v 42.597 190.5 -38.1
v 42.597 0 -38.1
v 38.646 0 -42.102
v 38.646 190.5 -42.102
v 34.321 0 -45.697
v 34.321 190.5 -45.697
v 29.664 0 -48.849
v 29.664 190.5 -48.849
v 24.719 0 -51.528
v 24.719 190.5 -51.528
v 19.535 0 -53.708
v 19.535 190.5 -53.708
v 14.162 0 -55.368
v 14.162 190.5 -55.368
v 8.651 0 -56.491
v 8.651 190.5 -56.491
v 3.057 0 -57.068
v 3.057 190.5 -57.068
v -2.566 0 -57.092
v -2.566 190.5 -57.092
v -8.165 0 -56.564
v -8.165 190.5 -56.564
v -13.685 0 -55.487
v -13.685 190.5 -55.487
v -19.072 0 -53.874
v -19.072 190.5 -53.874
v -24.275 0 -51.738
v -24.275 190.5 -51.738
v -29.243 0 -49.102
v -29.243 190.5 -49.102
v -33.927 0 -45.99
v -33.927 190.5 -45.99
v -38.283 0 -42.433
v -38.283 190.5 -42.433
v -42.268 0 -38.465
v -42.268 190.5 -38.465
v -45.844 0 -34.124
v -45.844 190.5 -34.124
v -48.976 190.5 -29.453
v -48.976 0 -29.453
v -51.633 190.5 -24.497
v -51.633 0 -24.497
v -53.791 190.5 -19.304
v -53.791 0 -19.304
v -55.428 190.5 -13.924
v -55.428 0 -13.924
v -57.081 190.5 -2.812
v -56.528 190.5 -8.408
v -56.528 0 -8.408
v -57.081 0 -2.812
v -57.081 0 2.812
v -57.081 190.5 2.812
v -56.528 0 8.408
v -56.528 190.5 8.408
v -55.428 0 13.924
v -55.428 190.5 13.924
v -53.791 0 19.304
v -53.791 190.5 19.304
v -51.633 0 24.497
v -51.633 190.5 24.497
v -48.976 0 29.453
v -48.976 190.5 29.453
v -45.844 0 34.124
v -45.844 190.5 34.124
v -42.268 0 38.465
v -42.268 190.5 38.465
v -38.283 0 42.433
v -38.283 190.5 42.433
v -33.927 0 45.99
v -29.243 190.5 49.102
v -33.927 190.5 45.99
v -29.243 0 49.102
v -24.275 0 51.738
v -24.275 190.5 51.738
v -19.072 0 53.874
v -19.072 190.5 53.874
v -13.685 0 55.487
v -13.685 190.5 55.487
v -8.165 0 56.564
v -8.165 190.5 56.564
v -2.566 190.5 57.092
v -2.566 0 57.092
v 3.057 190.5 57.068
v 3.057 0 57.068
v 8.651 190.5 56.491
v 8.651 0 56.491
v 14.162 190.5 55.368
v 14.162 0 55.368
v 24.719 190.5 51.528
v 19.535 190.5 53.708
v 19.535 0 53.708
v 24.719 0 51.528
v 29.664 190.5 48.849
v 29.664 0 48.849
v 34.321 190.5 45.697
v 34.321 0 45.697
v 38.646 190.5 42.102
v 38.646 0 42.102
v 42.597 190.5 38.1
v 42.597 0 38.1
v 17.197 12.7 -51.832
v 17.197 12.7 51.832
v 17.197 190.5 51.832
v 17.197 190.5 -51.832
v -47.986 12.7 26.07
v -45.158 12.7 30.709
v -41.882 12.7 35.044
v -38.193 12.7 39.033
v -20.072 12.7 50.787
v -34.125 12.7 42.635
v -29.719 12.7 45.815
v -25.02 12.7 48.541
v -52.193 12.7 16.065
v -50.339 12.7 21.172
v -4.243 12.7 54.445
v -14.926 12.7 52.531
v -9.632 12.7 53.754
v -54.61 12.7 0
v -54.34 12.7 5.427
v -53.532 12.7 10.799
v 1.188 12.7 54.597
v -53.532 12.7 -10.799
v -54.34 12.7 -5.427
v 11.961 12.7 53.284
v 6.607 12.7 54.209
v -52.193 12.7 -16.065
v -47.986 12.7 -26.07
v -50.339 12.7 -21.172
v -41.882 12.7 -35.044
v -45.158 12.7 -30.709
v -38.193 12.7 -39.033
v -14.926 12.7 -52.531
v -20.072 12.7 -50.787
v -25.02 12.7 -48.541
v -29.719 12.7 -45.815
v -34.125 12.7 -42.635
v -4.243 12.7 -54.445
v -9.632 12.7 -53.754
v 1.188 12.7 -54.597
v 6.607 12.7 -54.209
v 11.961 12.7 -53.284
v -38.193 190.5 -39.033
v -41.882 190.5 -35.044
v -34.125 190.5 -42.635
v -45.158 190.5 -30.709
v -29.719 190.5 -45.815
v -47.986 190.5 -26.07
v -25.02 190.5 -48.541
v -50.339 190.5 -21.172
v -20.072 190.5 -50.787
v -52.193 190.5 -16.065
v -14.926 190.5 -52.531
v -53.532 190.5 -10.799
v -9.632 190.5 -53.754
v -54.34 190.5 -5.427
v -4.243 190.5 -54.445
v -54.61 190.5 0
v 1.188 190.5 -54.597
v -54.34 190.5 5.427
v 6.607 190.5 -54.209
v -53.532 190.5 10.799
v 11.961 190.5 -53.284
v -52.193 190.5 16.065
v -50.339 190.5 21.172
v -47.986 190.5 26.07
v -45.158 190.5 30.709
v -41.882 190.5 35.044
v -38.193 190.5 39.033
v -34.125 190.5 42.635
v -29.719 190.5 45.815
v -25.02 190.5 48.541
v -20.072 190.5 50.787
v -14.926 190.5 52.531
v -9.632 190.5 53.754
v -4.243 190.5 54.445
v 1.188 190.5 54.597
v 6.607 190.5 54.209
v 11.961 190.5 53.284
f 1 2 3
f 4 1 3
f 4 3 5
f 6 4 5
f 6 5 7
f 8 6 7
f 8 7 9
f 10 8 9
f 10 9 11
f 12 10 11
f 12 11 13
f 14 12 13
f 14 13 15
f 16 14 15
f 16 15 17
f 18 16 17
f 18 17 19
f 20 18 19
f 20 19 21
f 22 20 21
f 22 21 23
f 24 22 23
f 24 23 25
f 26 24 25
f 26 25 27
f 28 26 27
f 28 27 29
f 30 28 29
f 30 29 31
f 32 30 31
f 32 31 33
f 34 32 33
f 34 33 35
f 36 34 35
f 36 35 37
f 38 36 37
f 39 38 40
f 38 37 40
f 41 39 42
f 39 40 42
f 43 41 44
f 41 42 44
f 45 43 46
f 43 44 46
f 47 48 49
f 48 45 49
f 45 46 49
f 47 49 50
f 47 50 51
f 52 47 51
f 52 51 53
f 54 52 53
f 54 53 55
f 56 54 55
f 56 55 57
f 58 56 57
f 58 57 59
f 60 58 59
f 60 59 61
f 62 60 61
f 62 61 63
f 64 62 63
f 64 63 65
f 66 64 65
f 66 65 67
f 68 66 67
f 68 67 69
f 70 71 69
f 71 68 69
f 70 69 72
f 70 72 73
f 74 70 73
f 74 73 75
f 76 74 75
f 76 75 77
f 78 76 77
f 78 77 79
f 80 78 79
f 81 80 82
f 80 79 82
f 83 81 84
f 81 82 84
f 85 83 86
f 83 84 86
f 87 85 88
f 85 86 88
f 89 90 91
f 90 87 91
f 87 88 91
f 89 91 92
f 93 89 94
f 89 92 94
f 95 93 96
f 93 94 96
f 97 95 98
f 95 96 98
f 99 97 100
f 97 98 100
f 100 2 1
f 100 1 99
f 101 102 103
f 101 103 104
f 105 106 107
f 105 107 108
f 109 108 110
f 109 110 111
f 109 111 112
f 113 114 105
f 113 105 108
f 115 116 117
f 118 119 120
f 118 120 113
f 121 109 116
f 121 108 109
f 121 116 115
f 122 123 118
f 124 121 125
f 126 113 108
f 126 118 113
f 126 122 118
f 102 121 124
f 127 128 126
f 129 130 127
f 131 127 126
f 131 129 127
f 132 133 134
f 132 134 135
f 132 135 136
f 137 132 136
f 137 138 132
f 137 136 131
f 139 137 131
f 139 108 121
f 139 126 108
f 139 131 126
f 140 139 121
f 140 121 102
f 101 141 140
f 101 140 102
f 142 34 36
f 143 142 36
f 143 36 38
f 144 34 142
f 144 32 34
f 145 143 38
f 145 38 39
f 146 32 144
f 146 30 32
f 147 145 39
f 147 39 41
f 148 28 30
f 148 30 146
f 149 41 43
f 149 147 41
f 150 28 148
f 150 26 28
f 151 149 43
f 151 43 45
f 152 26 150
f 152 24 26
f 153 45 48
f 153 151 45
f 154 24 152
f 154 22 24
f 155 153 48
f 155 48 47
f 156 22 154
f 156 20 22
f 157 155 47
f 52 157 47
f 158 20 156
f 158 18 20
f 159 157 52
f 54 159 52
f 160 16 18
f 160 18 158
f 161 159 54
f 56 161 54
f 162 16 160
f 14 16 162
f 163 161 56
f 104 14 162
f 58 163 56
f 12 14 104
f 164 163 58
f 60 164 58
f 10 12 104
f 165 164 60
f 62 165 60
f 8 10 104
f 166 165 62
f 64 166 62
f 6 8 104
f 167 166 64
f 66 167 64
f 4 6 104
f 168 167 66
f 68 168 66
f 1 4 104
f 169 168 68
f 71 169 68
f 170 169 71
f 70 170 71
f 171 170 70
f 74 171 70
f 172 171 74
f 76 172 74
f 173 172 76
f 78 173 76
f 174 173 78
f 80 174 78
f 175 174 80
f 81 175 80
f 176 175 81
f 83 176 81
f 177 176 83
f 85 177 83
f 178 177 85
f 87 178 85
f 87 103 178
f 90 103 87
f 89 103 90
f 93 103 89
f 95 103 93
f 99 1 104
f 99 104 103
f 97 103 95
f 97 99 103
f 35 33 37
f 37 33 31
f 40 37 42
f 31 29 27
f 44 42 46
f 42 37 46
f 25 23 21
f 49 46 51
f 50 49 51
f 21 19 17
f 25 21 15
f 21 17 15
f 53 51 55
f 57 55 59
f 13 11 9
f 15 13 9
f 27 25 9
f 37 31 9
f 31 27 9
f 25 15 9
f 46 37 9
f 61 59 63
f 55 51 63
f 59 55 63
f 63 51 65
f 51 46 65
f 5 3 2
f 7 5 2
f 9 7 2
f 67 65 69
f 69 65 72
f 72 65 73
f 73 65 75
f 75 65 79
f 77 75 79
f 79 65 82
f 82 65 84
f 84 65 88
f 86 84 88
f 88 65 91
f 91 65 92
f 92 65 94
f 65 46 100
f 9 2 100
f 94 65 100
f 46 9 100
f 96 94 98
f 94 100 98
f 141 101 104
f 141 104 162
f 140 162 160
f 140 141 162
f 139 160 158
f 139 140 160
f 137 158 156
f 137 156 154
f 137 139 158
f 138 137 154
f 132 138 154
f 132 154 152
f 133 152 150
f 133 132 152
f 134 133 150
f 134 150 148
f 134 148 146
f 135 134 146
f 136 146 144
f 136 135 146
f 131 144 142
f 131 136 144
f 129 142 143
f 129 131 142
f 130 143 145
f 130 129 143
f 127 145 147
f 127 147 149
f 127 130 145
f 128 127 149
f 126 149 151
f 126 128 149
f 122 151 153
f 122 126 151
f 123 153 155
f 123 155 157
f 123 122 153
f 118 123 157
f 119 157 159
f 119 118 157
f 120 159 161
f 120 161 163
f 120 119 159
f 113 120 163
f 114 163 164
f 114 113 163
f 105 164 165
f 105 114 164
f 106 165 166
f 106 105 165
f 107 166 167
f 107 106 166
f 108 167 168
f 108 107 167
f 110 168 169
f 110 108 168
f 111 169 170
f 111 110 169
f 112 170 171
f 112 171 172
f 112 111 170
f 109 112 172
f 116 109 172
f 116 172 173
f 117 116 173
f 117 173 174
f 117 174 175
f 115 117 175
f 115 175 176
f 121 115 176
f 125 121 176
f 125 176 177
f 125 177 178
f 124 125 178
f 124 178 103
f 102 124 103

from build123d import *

# Parameters (mm, degrees)
SKETCH1_R           = 57.15
BOSS_EXTRUDE1_DEPTH = 190.5
CUT_EXTRUDE1_START  = -190.5
CUT_EXTRUDE1_DEPTH  = 190.5
SHELL2_START        = 12.7
SHELL2_DEPTH        = 177.8


# Read off the part's stored shape, not the designer's step: Shell2
with BuildPart() as part:
    # Sketch1 → Boss-Extrude1 (new body)
    with BuildSketch(Plane(origin=(0, 0, 0), x_dir=(1, 0, 0), z_dir=(0, 1, 0))):
        with Locations(Location((0, 0, 0), (0, 0, 270))):
            Circle(SKETCH1_R)
    extrude(amount=BOSS_EXTRUDE1_DEPTH)

    # Sketch2 → Cut-Extrude1 (cut)
    with BuildSketch(Plane(origin=(0, 190.5, 0), x_dir=(1, 0, 0), z_dir=(0, 1, 0)).offset(CUT_EXTRUDE1_START)):
        with BuildLine():
            Line((42.597094971, 38.1), (42.597094971, -38.1))
            ThreePointArc((42.597094971, -38.1), (53.387950315, -20.392382431), (57.15, 0))
            ThreePointArc((57.15, 0), (53.387950315, 20.392382431), (42.597094971, 38.1))
        make_face()
    extrude(amount=CUT_EXTRUDE1_DEPTH, mode=Mode.SUBTRACT)

    # Shell2 outline → Shell2 (cut)
    with BuildSketch(Plane(origin=(0, 0, 0), x_dir=(1, 0, 0), z_dir=(0, 1, 0)).offset(SHELL2_START)):
        with BuildLine():
            ThreePointArc((17.197094971, 51.831573626), (-54.61, 0), (17.197094971, -51.831573626))
            Line((17.197094971, -51.831573626), (17.197094971, 51.831573626))
        make_face()
    extrude(amount=SHELL2_DEPTH, mode=Mode.SUBTRACT)


solid = part.part
